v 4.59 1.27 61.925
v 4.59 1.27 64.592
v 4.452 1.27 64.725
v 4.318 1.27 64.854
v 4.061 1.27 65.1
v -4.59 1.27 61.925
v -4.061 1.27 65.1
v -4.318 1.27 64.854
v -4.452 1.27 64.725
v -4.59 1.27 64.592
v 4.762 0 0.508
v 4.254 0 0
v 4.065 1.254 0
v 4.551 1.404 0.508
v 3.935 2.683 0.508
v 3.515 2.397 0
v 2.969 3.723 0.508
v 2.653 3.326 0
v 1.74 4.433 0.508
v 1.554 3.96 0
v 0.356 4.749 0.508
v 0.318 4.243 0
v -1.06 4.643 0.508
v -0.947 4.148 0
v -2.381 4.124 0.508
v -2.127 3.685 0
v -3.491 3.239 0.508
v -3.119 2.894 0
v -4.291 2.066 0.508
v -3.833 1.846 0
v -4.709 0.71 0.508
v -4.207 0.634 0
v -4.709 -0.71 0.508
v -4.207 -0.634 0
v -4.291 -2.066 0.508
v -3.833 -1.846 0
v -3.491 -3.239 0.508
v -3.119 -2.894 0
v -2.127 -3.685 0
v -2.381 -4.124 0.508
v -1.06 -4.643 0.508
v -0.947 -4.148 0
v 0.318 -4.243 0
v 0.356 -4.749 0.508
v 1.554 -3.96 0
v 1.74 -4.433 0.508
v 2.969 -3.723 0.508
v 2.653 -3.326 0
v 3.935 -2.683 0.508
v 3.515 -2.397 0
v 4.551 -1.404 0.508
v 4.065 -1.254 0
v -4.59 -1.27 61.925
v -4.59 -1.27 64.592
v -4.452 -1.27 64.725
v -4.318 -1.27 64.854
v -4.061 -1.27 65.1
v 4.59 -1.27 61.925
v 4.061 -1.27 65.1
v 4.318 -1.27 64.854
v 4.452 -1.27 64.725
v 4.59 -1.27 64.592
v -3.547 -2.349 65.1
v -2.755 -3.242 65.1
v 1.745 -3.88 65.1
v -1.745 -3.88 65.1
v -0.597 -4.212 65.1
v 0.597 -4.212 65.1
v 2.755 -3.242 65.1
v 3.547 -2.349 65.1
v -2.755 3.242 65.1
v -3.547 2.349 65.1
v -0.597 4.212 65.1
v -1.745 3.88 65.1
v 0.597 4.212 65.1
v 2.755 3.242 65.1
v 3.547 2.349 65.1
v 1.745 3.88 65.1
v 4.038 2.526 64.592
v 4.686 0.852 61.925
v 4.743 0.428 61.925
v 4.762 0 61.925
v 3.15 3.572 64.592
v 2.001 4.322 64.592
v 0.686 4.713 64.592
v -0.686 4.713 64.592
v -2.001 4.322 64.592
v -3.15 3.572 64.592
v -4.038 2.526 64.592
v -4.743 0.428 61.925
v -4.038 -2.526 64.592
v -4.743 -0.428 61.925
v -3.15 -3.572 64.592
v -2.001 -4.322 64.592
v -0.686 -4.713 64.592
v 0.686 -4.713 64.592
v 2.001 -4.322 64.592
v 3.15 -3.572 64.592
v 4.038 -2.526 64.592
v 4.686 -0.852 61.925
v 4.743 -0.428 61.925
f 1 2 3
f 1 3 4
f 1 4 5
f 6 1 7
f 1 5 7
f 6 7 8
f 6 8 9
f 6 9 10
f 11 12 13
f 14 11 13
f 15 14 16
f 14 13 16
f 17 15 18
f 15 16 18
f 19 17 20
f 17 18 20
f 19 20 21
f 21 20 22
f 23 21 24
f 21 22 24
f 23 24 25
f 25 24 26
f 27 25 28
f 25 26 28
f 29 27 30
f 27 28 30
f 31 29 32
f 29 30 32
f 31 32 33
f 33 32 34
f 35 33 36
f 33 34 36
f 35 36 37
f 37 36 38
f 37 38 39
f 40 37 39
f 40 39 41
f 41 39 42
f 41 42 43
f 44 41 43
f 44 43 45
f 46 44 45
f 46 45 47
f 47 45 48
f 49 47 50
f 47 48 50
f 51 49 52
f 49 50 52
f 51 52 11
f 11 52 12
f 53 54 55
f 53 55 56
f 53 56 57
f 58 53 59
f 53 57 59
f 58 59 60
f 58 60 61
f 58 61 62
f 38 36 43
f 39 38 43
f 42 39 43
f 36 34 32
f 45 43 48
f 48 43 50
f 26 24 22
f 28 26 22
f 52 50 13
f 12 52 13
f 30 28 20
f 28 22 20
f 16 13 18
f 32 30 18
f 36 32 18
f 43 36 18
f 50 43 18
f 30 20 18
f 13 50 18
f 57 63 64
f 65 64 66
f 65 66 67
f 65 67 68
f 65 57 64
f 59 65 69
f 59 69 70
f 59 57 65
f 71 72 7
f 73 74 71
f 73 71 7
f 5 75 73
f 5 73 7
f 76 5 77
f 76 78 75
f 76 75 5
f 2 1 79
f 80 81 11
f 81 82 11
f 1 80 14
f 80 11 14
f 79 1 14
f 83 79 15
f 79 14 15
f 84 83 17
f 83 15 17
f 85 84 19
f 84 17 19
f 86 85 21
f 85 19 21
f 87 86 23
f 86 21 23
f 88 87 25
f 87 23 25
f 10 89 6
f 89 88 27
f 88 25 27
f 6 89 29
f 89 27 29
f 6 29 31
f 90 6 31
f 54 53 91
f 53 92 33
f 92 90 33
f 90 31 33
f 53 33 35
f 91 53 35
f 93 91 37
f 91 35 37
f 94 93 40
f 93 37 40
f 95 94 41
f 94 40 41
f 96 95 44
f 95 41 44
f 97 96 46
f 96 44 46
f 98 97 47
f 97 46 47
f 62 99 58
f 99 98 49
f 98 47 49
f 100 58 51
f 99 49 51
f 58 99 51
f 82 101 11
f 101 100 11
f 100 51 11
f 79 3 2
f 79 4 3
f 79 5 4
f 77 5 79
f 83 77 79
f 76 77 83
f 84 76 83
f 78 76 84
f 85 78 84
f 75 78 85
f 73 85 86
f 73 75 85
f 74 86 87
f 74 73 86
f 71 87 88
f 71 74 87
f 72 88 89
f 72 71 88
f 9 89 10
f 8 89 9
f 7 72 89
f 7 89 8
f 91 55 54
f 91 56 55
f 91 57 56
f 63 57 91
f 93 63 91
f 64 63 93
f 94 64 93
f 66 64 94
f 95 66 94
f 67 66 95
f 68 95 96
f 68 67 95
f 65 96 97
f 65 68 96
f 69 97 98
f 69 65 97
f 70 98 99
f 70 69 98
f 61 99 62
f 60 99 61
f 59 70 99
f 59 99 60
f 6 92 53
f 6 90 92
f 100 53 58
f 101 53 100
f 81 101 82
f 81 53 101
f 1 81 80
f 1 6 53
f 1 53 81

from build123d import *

# Parameters (mm, degrees)
SKETCH2_R           = 4.7625
BOSS_EXTRUDE1_DEPTH = 65.1002
CUT_EXTRUDE1_DEPTH  = 3.175
CHAMFER1_SIZE       = 0.508


with BuildPart() as part:
    # Sketch2 → Boss-Extrude1 (new body)
    with BuildSketch(Plane.XY):
        Circle(SKETCH2_R)
    extrude(amount=BOSS_EXTRUDE1_DEPTH)

    # Sketch3 → Cut-Extrude1 (cut)
    with BuildSketch(Plane.XY.offset(65.1002)):
        Polygon((4.7625, 0), (4.7625, 1.27), (-4.7625, 1.27), (-4.7625, 0), (-4.7625, -1.27), (4.7625, -1.27), align=None)
    extrude(amount=-CUT_EXTRUDE1_DEPTH, mode=Mode.SUBTRACT)

    # Chamfer1
    chamfer1_edges = [part.edges().sort_by_distance(p)[0] for p in [
        (-4.7625, 0, 0),
        (0, 4.7625, 65.1002),
        (0, -4.7625, 65.1002),
    ]]
    chamfer(chamfer1_edges, length=CHAMFER1_SIZE)


solid = part.part
